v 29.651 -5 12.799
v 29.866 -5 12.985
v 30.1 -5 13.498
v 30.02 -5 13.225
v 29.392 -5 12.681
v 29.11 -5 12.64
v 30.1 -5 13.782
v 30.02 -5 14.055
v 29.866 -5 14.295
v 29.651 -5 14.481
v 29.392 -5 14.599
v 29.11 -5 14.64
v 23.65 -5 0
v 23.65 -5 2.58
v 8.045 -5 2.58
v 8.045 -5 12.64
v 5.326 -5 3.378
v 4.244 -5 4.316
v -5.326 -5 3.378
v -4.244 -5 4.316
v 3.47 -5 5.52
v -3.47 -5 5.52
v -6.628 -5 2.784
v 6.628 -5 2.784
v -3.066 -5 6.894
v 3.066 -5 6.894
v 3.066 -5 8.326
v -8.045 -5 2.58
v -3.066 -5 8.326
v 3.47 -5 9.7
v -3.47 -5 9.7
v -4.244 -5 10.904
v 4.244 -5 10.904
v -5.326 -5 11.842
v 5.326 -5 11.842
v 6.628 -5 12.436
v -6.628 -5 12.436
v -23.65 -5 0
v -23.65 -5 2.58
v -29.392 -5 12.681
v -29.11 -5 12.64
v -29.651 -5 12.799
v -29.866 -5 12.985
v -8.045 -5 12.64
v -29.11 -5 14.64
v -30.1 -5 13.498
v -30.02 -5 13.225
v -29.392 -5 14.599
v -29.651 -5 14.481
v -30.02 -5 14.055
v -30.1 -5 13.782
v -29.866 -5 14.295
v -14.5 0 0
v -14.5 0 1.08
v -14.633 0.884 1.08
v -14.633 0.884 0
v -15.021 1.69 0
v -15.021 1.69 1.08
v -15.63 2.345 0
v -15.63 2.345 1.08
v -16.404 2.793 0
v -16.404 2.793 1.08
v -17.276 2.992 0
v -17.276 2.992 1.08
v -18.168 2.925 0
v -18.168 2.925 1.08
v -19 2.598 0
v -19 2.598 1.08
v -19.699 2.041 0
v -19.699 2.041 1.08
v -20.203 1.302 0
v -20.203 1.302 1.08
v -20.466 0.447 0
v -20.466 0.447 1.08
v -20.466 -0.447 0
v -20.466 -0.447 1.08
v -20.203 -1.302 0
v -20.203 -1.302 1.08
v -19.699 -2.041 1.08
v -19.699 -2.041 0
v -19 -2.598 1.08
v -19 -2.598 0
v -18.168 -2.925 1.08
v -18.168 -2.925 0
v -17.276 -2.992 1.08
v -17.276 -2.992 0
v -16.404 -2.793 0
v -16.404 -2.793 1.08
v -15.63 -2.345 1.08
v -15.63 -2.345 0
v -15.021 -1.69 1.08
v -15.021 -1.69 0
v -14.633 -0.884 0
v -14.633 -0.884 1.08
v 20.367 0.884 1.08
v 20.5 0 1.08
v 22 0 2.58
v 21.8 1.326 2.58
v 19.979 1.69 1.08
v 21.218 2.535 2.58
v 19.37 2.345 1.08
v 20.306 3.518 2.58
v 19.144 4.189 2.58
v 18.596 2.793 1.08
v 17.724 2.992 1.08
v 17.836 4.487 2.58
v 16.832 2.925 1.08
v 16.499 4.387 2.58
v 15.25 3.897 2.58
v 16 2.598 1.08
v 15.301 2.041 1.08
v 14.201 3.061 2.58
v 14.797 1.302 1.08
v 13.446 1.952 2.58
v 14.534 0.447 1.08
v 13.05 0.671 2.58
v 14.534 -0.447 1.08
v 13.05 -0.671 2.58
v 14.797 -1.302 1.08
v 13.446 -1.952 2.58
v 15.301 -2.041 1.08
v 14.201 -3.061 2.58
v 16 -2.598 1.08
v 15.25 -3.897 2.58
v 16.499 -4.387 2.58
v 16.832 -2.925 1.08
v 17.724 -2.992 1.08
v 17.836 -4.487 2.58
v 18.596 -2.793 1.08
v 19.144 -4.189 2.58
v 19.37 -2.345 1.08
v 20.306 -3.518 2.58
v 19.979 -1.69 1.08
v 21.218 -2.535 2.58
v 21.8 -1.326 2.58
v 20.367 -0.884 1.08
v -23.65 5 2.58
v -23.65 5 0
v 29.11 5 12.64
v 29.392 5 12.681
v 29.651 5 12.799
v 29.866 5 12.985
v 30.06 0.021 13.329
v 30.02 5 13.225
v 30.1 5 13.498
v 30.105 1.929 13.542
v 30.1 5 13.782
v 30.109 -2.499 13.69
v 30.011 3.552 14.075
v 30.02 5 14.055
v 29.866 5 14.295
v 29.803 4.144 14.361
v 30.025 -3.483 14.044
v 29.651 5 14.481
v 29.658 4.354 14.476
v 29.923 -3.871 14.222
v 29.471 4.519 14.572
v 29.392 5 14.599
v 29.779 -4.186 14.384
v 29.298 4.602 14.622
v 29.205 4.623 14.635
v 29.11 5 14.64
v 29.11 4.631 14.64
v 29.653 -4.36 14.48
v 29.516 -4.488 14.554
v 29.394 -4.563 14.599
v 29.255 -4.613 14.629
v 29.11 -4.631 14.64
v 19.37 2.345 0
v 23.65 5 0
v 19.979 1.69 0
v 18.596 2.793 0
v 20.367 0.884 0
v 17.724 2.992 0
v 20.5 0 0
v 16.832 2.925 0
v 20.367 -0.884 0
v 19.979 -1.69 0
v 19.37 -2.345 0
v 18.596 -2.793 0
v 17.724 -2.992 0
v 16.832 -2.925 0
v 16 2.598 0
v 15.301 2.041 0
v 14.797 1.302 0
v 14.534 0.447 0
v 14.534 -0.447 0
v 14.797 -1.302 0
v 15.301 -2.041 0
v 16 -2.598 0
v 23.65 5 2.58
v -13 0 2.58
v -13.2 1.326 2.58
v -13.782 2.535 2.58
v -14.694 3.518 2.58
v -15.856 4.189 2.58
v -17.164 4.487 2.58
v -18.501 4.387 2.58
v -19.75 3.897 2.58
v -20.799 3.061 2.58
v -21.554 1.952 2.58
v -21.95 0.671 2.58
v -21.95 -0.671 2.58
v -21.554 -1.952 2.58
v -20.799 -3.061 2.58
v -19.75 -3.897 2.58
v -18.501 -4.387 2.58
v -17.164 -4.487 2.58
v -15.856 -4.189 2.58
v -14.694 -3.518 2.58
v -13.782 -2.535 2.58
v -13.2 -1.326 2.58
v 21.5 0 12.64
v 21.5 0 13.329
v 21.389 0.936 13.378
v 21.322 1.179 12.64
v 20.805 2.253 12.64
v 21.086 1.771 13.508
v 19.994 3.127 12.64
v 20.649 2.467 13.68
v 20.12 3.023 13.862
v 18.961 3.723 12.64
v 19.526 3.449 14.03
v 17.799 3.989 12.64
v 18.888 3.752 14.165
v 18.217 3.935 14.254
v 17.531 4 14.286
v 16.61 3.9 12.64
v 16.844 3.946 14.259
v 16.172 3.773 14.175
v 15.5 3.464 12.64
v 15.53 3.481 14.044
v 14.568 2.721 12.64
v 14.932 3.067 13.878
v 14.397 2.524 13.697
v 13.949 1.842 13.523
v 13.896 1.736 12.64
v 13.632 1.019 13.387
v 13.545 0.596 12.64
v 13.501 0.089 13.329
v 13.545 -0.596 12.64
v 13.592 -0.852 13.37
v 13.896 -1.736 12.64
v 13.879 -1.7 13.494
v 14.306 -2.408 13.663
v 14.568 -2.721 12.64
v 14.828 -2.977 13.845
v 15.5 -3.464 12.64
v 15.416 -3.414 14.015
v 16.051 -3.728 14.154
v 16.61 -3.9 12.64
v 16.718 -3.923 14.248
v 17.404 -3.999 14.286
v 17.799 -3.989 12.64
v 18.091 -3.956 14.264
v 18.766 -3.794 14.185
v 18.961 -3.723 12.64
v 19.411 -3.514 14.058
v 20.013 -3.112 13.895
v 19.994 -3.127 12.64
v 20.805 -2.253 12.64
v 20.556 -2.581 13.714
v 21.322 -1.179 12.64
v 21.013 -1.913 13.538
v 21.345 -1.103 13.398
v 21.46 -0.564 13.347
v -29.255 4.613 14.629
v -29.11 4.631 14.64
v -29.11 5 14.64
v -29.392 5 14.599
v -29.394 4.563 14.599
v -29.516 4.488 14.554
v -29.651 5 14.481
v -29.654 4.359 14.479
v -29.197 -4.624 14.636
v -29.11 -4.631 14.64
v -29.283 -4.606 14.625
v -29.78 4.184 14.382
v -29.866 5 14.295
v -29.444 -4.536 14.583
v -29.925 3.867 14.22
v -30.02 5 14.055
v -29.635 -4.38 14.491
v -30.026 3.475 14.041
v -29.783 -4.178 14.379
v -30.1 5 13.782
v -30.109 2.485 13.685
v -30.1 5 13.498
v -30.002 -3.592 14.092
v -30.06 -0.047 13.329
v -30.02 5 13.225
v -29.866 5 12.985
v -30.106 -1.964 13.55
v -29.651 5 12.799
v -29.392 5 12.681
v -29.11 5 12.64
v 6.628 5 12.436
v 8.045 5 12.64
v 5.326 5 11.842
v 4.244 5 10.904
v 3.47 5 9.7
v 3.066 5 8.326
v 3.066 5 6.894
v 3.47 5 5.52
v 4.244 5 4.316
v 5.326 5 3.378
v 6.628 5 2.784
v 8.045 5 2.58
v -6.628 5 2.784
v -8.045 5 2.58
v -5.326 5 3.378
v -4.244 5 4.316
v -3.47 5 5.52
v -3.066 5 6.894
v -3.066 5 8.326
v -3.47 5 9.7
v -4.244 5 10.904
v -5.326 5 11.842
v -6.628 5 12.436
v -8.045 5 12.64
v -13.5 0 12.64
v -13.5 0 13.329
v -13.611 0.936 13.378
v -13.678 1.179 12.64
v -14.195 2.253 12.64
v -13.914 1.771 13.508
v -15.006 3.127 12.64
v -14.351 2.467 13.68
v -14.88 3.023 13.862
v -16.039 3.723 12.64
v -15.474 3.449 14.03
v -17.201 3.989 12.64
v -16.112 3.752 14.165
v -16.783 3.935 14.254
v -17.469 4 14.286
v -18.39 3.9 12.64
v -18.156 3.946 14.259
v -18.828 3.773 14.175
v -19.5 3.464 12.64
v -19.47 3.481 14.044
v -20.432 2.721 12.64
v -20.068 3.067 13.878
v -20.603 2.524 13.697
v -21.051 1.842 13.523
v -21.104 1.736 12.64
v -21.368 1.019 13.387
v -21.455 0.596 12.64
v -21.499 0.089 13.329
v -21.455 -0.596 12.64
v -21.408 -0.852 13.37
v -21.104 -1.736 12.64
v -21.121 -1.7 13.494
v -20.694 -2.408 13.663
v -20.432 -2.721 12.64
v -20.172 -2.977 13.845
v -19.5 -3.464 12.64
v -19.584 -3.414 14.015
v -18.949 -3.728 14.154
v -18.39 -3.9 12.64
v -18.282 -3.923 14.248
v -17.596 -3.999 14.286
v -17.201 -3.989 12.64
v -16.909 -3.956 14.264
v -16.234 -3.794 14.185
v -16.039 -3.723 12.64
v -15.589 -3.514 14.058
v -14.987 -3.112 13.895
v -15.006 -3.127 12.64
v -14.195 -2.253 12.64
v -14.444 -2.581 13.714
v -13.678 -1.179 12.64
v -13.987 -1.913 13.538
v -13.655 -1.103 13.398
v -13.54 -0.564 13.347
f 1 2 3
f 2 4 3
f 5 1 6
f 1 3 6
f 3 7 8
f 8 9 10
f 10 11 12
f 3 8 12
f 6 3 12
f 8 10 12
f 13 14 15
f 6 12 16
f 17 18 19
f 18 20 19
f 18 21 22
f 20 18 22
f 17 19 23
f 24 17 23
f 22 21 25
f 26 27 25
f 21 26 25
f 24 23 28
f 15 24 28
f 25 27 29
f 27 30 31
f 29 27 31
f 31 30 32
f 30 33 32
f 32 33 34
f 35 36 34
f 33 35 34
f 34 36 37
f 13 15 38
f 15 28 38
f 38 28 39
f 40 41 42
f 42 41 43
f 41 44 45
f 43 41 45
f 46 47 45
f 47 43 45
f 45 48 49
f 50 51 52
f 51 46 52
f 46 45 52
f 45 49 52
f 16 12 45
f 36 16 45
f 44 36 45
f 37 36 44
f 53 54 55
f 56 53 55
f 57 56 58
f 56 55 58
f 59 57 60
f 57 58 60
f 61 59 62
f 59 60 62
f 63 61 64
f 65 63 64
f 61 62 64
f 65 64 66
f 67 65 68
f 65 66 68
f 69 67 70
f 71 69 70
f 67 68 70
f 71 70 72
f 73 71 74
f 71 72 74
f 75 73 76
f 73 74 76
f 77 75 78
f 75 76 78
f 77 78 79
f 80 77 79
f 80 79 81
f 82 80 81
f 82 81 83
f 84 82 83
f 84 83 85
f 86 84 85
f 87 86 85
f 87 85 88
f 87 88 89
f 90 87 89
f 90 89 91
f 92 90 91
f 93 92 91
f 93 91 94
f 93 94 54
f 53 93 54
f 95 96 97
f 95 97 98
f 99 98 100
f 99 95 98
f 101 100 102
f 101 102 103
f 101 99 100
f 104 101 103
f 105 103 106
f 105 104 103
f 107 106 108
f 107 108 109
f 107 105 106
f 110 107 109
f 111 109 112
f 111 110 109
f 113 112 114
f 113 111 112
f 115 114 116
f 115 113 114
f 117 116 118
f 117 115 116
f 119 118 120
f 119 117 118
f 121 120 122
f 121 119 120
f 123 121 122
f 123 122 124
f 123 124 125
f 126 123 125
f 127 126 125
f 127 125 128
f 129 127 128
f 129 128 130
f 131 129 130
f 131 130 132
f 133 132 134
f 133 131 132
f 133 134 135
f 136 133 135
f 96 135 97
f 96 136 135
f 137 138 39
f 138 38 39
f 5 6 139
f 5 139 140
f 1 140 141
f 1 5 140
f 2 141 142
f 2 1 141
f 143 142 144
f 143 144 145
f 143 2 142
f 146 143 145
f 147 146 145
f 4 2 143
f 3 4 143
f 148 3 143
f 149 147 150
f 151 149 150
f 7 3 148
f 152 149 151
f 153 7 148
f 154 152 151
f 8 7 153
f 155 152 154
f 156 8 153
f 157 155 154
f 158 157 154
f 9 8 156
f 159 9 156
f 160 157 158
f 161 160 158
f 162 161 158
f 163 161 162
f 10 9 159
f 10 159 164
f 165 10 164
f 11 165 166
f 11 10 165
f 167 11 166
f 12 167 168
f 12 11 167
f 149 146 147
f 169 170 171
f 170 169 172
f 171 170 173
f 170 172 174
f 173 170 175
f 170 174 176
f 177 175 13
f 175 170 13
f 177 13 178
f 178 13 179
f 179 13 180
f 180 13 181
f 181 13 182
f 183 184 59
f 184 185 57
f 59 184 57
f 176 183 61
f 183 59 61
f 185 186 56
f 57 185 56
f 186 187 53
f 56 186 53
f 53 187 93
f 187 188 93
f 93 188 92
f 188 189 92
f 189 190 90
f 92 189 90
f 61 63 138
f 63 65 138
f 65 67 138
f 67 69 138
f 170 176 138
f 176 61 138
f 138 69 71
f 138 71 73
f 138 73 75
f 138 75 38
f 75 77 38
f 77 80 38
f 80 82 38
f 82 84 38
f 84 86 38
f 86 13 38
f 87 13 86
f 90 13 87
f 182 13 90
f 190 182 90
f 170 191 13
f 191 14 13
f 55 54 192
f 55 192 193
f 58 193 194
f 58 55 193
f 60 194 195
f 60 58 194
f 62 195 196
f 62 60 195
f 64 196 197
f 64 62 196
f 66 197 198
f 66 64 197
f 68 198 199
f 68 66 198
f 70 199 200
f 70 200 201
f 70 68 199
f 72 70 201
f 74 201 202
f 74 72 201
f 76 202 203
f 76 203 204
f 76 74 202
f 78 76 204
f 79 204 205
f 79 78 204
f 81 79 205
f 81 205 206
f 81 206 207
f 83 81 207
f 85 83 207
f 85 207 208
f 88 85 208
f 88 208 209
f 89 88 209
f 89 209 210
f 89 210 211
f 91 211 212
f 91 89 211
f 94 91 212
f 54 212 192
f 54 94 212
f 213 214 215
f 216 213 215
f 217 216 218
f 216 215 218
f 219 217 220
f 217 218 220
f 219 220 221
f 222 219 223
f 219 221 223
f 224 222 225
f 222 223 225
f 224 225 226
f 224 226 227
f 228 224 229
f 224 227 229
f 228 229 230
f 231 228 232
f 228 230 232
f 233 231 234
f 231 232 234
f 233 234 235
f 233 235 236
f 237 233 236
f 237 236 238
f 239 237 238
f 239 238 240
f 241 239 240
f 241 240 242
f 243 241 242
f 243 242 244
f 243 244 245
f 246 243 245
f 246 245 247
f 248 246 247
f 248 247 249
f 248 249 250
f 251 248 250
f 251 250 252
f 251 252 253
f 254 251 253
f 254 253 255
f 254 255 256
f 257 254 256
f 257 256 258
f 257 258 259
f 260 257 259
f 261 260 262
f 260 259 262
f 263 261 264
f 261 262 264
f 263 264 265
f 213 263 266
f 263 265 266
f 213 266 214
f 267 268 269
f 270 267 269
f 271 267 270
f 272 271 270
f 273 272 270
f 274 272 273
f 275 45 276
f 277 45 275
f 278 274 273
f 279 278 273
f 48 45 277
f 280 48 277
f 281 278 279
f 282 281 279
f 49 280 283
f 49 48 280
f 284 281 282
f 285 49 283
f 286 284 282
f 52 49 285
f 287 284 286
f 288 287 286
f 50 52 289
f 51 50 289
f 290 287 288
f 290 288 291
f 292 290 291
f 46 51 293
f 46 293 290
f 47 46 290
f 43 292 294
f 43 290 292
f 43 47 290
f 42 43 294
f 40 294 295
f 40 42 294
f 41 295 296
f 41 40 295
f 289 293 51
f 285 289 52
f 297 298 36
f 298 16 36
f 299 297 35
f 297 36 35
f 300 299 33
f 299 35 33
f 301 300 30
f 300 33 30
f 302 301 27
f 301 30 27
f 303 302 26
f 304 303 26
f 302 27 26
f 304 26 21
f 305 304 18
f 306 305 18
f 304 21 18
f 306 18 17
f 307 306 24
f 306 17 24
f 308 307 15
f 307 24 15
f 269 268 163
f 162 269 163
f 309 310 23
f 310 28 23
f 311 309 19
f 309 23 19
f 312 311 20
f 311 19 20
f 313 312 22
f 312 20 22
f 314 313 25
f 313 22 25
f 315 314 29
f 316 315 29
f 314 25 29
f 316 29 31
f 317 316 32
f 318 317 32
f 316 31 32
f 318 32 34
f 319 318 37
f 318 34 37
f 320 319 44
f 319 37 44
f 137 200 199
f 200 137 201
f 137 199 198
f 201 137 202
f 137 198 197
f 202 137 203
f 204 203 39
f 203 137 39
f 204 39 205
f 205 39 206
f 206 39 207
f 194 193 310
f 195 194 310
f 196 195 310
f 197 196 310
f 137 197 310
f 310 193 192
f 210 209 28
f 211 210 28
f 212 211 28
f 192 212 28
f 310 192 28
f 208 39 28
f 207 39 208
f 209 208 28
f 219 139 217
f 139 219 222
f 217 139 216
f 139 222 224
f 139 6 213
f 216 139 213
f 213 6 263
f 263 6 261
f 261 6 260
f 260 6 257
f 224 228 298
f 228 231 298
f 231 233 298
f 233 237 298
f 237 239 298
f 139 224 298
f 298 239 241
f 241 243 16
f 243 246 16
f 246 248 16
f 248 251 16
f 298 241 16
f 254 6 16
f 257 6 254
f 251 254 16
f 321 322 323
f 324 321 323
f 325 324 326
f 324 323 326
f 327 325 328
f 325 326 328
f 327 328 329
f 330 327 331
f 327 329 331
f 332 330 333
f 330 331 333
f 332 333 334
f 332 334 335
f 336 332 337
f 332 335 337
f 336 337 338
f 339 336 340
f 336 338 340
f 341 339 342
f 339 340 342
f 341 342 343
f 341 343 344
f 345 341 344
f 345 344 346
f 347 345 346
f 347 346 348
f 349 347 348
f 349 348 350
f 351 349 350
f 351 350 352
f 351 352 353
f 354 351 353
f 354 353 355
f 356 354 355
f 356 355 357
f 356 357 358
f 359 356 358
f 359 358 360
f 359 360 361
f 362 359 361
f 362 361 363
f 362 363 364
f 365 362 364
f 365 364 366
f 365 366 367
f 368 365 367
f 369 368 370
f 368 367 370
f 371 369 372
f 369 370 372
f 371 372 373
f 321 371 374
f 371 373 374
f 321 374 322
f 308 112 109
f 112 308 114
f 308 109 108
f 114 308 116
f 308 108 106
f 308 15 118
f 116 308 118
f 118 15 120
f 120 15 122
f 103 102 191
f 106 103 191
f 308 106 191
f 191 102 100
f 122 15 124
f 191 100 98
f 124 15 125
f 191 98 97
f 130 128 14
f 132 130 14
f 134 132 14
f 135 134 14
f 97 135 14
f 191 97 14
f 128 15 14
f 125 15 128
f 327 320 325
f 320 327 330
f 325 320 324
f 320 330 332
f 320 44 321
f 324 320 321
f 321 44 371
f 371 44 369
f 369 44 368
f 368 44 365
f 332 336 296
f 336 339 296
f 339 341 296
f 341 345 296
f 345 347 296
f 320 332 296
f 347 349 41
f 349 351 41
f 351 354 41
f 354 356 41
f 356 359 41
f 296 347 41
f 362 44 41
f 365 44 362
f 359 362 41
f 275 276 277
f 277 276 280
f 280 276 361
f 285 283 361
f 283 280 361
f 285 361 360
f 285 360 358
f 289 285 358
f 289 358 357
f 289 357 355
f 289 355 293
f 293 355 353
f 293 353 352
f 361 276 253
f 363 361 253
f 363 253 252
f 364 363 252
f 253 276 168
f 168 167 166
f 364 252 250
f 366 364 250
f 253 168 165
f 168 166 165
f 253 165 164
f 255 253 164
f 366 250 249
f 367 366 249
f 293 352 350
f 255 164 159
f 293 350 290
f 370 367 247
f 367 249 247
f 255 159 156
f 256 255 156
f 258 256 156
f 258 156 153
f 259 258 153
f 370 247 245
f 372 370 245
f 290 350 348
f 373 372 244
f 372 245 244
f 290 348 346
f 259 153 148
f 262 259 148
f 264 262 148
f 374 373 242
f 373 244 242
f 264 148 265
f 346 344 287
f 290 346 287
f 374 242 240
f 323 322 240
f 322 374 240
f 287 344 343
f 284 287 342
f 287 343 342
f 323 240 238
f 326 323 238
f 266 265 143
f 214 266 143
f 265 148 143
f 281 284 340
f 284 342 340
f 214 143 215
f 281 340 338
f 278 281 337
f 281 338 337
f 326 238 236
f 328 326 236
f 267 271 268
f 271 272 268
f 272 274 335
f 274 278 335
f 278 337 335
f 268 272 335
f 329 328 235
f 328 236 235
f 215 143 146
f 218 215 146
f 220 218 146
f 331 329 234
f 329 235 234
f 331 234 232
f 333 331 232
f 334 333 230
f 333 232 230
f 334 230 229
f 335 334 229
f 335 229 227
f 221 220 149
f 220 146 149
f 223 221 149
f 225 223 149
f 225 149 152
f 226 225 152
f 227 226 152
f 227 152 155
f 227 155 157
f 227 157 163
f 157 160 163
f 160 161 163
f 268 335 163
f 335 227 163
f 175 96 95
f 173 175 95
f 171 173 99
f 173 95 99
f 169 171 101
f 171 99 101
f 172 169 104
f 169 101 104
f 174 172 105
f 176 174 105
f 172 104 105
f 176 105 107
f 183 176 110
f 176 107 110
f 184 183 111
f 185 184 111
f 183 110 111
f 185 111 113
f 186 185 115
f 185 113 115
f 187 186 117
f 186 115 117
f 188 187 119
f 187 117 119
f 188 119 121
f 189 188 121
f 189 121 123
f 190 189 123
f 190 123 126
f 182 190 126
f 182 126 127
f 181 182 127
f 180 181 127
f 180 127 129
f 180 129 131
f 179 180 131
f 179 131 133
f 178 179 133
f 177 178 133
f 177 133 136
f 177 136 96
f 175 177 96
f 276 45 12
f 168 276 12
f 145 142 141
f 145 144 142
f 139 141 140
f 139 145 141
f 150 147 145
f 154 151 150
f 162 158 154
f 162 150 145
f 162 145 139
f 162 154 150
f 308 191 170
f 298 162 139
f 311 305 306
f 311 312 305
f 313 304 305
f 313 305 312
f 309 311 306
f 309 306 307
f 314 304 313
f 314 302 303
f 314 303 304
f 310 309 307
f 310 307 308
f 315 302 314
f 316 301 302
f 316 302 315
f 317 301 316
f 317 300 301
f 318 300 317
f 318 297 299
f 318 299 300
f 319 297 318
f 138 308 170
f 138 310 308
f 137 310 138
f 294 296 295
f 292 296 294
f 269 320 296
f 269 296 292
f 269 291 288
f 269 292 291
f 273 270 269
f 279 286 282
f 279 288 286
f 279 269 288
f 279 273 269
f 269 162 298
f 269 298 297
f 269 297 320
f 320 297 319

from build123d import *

# Parameters (mm, degrees)
PAD_DEPTH            = 5
SKETCH001_R          = 4
POCKET_DEPTH         = 5
SKETCH002_R          = 3
POCKET001_DEPTH      = 5
CHAMFER_SIZE         = 1.5
POCKET002_DEPTH      = 30.111
POCKET002_DEPTH_BACK = -30.111


with BuildPart() as part:
    # Sketch → Pad (new body, symmetric)
    with BuildSketch(Plane.XZ):
        with BuildLine():
            Line((-29.11, 14.64), (29.11, 14.64))
            ThreePointArc((29.11, 12.64), (30.11, 13.64), (29.11, 14.64))
            Line((29.11, 12.64), (8.045, 12.64))
            ThreePointArc((8.045, 12.64), (3.015, 7.61), (8.045, 2.58))
            Line((8.045, 2.58), (23.65, 2.58))
            Line((23.65, 2.58), (23.65, 0))
            Line((23.65, 0), (-23.65, 0))
            Line((-23.65, 0), (-23.65, 2.58))
            Line((-23.65, 2.58), (-8.045, 2.58))
            ThreePointArc((-8.045, 2.58), (-3.015, 7.61), (-8.045, 12.64))
            Line((-8.045, 12.64), (-29.11, 12.64))
            ThreePointArc((-29.11, 14.64), (-30.11, 13.64), (-29.11, 12.64))
        make_face()
    extrude(amount=PAD_DEPTH, both=True)

    # Sketch001 → Pocket (cut)
    with BuildSketch(Plane.XY.offset(15)):
        with Locations((-17.5, 0)):
            Circle(SKETCH001_R)
        with Locations((17.5, 0)):
            Circle(SKETCH001_R)
    extrude(amount=-POCKET_DEPTH, mode=Mode.SUBTRACT)

    # Sketch002 → Pocket001 (cut)
    with BuildSketch(Plane.XY.offset(3)):
        with Locations((-17.5, 0)):
            Circle(SKETCH002_R)
        with Locations((17.5, 0)):
            Circle(SKETCH002_R)
    extrude(amount=-POCKET001_DEPTH, mode=Mode.SUBTRACT)

    # Chamfer
    chamfer_edges = [part.edges().sort_by_distance(p)[0] for p in [
        (-20.5, 0, 2.58),
        (14.5, 0, 2.58),
    ]]
    chamfer(chamfer_edges, length=CHAMFER_SIZE)

    # Sketch003 → Pocket002 (cut, two sides)
    with BuildSketch(Plane.YZ) as pocket002_sk:
        with BuildLine():
            ThreePointArc((-7.064252, 16.860308), (0, 13.328536), (7.064252, 16.860308))
            Line((-7.064252, 16.860308), (7.064252, 16.860308))
        make_face()
    extrude(amount=-POCKET002_DEPTH, mode=Mode.SUBTRACT)
    extrude(pocket002_sk.sketch, amount=-POCKET002_DEPTH_BACK, mode=Mode.SUBTRACT)


solid = part.part
